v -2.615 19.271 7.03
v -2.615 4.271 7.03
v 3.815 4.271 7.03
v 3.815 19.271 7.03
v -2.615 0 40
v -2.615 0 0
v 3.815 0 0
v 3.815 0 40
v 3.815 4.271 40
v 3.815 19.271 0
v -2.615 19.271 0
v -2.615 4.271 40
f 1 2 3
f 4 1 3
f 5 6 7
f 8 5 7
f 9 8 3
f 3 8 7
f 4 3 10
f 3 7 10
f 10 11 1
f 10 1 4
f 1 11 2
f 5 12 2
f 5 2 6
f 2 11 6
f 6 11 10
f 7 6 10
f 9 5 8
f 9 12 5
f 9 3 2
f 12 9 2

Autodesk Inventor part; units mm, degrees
ref_plane "YZ Plane" through (0, 0, 0) normal (1, 0, 0) x (0, 1, 0)
ref_plane "XZ Plane" through (0, 0, 0) normal (0, 1, 0) x (-1, 0, 0)
ref_plane "XY Plane" through (0, 0, 0) normal (0, 0, 1) x (1, 0, 0)
sketch "Sketch1" plane through (0, 0, 0) normal (0, 0, 1) x (1, 0, 0)
  line L0 (-2.6152, 0) -> (3.8148, 0)
  line L1 (3.8148, 0) -> (3.8148, 4.2707)
  line L2 (3.8148, 4.2707) -> (-2.6152, 4.2707)
  line L3 (-2.6152, 4.2707) -> (-2.6152, 0)
  point P0 (0, 0)
extrude "Extrusion1" add sketch "Sketch1" along normal blind 40
sketch "Sketch2" plane through (-2.6152, 4.2707, 0) normal (0, 1, 0) x (1, 0, 0)
  line L0 (0, 0) -> (0, -40) projected
  line L1 (0, -7.0299) -> (6.43, -7.0299)
  line L2 (6.43, -7.0299) -> (6.43, 0)
  line L3 (6.43, 0) -> (0, 0)
  line L4 (0, 0) -> (0, -7.0299)
  point P0 (2.6152, 0)
extrude "Extrusion2" add sketch "Sketch2" along normal blind 15
equation "\"BendRadius\" = Thickness"
equation "\"BendReliefWidth\" = Thickness"
equation "\"BendReliefDepth\" = 0.5 * Thickness"
equation "\"CornerReliefSize\" = 4 * Thickness"
equation "\"MinimumRemnant\" = 2 * Thickness"
equation "\"TransitionRadius\" = BendRadius"
equation "\"JacobiRadiusSize\" = BendRadius"
equation "\"GapSize\" = Thickness"
equation "\"Thickness\" = 0.5"
